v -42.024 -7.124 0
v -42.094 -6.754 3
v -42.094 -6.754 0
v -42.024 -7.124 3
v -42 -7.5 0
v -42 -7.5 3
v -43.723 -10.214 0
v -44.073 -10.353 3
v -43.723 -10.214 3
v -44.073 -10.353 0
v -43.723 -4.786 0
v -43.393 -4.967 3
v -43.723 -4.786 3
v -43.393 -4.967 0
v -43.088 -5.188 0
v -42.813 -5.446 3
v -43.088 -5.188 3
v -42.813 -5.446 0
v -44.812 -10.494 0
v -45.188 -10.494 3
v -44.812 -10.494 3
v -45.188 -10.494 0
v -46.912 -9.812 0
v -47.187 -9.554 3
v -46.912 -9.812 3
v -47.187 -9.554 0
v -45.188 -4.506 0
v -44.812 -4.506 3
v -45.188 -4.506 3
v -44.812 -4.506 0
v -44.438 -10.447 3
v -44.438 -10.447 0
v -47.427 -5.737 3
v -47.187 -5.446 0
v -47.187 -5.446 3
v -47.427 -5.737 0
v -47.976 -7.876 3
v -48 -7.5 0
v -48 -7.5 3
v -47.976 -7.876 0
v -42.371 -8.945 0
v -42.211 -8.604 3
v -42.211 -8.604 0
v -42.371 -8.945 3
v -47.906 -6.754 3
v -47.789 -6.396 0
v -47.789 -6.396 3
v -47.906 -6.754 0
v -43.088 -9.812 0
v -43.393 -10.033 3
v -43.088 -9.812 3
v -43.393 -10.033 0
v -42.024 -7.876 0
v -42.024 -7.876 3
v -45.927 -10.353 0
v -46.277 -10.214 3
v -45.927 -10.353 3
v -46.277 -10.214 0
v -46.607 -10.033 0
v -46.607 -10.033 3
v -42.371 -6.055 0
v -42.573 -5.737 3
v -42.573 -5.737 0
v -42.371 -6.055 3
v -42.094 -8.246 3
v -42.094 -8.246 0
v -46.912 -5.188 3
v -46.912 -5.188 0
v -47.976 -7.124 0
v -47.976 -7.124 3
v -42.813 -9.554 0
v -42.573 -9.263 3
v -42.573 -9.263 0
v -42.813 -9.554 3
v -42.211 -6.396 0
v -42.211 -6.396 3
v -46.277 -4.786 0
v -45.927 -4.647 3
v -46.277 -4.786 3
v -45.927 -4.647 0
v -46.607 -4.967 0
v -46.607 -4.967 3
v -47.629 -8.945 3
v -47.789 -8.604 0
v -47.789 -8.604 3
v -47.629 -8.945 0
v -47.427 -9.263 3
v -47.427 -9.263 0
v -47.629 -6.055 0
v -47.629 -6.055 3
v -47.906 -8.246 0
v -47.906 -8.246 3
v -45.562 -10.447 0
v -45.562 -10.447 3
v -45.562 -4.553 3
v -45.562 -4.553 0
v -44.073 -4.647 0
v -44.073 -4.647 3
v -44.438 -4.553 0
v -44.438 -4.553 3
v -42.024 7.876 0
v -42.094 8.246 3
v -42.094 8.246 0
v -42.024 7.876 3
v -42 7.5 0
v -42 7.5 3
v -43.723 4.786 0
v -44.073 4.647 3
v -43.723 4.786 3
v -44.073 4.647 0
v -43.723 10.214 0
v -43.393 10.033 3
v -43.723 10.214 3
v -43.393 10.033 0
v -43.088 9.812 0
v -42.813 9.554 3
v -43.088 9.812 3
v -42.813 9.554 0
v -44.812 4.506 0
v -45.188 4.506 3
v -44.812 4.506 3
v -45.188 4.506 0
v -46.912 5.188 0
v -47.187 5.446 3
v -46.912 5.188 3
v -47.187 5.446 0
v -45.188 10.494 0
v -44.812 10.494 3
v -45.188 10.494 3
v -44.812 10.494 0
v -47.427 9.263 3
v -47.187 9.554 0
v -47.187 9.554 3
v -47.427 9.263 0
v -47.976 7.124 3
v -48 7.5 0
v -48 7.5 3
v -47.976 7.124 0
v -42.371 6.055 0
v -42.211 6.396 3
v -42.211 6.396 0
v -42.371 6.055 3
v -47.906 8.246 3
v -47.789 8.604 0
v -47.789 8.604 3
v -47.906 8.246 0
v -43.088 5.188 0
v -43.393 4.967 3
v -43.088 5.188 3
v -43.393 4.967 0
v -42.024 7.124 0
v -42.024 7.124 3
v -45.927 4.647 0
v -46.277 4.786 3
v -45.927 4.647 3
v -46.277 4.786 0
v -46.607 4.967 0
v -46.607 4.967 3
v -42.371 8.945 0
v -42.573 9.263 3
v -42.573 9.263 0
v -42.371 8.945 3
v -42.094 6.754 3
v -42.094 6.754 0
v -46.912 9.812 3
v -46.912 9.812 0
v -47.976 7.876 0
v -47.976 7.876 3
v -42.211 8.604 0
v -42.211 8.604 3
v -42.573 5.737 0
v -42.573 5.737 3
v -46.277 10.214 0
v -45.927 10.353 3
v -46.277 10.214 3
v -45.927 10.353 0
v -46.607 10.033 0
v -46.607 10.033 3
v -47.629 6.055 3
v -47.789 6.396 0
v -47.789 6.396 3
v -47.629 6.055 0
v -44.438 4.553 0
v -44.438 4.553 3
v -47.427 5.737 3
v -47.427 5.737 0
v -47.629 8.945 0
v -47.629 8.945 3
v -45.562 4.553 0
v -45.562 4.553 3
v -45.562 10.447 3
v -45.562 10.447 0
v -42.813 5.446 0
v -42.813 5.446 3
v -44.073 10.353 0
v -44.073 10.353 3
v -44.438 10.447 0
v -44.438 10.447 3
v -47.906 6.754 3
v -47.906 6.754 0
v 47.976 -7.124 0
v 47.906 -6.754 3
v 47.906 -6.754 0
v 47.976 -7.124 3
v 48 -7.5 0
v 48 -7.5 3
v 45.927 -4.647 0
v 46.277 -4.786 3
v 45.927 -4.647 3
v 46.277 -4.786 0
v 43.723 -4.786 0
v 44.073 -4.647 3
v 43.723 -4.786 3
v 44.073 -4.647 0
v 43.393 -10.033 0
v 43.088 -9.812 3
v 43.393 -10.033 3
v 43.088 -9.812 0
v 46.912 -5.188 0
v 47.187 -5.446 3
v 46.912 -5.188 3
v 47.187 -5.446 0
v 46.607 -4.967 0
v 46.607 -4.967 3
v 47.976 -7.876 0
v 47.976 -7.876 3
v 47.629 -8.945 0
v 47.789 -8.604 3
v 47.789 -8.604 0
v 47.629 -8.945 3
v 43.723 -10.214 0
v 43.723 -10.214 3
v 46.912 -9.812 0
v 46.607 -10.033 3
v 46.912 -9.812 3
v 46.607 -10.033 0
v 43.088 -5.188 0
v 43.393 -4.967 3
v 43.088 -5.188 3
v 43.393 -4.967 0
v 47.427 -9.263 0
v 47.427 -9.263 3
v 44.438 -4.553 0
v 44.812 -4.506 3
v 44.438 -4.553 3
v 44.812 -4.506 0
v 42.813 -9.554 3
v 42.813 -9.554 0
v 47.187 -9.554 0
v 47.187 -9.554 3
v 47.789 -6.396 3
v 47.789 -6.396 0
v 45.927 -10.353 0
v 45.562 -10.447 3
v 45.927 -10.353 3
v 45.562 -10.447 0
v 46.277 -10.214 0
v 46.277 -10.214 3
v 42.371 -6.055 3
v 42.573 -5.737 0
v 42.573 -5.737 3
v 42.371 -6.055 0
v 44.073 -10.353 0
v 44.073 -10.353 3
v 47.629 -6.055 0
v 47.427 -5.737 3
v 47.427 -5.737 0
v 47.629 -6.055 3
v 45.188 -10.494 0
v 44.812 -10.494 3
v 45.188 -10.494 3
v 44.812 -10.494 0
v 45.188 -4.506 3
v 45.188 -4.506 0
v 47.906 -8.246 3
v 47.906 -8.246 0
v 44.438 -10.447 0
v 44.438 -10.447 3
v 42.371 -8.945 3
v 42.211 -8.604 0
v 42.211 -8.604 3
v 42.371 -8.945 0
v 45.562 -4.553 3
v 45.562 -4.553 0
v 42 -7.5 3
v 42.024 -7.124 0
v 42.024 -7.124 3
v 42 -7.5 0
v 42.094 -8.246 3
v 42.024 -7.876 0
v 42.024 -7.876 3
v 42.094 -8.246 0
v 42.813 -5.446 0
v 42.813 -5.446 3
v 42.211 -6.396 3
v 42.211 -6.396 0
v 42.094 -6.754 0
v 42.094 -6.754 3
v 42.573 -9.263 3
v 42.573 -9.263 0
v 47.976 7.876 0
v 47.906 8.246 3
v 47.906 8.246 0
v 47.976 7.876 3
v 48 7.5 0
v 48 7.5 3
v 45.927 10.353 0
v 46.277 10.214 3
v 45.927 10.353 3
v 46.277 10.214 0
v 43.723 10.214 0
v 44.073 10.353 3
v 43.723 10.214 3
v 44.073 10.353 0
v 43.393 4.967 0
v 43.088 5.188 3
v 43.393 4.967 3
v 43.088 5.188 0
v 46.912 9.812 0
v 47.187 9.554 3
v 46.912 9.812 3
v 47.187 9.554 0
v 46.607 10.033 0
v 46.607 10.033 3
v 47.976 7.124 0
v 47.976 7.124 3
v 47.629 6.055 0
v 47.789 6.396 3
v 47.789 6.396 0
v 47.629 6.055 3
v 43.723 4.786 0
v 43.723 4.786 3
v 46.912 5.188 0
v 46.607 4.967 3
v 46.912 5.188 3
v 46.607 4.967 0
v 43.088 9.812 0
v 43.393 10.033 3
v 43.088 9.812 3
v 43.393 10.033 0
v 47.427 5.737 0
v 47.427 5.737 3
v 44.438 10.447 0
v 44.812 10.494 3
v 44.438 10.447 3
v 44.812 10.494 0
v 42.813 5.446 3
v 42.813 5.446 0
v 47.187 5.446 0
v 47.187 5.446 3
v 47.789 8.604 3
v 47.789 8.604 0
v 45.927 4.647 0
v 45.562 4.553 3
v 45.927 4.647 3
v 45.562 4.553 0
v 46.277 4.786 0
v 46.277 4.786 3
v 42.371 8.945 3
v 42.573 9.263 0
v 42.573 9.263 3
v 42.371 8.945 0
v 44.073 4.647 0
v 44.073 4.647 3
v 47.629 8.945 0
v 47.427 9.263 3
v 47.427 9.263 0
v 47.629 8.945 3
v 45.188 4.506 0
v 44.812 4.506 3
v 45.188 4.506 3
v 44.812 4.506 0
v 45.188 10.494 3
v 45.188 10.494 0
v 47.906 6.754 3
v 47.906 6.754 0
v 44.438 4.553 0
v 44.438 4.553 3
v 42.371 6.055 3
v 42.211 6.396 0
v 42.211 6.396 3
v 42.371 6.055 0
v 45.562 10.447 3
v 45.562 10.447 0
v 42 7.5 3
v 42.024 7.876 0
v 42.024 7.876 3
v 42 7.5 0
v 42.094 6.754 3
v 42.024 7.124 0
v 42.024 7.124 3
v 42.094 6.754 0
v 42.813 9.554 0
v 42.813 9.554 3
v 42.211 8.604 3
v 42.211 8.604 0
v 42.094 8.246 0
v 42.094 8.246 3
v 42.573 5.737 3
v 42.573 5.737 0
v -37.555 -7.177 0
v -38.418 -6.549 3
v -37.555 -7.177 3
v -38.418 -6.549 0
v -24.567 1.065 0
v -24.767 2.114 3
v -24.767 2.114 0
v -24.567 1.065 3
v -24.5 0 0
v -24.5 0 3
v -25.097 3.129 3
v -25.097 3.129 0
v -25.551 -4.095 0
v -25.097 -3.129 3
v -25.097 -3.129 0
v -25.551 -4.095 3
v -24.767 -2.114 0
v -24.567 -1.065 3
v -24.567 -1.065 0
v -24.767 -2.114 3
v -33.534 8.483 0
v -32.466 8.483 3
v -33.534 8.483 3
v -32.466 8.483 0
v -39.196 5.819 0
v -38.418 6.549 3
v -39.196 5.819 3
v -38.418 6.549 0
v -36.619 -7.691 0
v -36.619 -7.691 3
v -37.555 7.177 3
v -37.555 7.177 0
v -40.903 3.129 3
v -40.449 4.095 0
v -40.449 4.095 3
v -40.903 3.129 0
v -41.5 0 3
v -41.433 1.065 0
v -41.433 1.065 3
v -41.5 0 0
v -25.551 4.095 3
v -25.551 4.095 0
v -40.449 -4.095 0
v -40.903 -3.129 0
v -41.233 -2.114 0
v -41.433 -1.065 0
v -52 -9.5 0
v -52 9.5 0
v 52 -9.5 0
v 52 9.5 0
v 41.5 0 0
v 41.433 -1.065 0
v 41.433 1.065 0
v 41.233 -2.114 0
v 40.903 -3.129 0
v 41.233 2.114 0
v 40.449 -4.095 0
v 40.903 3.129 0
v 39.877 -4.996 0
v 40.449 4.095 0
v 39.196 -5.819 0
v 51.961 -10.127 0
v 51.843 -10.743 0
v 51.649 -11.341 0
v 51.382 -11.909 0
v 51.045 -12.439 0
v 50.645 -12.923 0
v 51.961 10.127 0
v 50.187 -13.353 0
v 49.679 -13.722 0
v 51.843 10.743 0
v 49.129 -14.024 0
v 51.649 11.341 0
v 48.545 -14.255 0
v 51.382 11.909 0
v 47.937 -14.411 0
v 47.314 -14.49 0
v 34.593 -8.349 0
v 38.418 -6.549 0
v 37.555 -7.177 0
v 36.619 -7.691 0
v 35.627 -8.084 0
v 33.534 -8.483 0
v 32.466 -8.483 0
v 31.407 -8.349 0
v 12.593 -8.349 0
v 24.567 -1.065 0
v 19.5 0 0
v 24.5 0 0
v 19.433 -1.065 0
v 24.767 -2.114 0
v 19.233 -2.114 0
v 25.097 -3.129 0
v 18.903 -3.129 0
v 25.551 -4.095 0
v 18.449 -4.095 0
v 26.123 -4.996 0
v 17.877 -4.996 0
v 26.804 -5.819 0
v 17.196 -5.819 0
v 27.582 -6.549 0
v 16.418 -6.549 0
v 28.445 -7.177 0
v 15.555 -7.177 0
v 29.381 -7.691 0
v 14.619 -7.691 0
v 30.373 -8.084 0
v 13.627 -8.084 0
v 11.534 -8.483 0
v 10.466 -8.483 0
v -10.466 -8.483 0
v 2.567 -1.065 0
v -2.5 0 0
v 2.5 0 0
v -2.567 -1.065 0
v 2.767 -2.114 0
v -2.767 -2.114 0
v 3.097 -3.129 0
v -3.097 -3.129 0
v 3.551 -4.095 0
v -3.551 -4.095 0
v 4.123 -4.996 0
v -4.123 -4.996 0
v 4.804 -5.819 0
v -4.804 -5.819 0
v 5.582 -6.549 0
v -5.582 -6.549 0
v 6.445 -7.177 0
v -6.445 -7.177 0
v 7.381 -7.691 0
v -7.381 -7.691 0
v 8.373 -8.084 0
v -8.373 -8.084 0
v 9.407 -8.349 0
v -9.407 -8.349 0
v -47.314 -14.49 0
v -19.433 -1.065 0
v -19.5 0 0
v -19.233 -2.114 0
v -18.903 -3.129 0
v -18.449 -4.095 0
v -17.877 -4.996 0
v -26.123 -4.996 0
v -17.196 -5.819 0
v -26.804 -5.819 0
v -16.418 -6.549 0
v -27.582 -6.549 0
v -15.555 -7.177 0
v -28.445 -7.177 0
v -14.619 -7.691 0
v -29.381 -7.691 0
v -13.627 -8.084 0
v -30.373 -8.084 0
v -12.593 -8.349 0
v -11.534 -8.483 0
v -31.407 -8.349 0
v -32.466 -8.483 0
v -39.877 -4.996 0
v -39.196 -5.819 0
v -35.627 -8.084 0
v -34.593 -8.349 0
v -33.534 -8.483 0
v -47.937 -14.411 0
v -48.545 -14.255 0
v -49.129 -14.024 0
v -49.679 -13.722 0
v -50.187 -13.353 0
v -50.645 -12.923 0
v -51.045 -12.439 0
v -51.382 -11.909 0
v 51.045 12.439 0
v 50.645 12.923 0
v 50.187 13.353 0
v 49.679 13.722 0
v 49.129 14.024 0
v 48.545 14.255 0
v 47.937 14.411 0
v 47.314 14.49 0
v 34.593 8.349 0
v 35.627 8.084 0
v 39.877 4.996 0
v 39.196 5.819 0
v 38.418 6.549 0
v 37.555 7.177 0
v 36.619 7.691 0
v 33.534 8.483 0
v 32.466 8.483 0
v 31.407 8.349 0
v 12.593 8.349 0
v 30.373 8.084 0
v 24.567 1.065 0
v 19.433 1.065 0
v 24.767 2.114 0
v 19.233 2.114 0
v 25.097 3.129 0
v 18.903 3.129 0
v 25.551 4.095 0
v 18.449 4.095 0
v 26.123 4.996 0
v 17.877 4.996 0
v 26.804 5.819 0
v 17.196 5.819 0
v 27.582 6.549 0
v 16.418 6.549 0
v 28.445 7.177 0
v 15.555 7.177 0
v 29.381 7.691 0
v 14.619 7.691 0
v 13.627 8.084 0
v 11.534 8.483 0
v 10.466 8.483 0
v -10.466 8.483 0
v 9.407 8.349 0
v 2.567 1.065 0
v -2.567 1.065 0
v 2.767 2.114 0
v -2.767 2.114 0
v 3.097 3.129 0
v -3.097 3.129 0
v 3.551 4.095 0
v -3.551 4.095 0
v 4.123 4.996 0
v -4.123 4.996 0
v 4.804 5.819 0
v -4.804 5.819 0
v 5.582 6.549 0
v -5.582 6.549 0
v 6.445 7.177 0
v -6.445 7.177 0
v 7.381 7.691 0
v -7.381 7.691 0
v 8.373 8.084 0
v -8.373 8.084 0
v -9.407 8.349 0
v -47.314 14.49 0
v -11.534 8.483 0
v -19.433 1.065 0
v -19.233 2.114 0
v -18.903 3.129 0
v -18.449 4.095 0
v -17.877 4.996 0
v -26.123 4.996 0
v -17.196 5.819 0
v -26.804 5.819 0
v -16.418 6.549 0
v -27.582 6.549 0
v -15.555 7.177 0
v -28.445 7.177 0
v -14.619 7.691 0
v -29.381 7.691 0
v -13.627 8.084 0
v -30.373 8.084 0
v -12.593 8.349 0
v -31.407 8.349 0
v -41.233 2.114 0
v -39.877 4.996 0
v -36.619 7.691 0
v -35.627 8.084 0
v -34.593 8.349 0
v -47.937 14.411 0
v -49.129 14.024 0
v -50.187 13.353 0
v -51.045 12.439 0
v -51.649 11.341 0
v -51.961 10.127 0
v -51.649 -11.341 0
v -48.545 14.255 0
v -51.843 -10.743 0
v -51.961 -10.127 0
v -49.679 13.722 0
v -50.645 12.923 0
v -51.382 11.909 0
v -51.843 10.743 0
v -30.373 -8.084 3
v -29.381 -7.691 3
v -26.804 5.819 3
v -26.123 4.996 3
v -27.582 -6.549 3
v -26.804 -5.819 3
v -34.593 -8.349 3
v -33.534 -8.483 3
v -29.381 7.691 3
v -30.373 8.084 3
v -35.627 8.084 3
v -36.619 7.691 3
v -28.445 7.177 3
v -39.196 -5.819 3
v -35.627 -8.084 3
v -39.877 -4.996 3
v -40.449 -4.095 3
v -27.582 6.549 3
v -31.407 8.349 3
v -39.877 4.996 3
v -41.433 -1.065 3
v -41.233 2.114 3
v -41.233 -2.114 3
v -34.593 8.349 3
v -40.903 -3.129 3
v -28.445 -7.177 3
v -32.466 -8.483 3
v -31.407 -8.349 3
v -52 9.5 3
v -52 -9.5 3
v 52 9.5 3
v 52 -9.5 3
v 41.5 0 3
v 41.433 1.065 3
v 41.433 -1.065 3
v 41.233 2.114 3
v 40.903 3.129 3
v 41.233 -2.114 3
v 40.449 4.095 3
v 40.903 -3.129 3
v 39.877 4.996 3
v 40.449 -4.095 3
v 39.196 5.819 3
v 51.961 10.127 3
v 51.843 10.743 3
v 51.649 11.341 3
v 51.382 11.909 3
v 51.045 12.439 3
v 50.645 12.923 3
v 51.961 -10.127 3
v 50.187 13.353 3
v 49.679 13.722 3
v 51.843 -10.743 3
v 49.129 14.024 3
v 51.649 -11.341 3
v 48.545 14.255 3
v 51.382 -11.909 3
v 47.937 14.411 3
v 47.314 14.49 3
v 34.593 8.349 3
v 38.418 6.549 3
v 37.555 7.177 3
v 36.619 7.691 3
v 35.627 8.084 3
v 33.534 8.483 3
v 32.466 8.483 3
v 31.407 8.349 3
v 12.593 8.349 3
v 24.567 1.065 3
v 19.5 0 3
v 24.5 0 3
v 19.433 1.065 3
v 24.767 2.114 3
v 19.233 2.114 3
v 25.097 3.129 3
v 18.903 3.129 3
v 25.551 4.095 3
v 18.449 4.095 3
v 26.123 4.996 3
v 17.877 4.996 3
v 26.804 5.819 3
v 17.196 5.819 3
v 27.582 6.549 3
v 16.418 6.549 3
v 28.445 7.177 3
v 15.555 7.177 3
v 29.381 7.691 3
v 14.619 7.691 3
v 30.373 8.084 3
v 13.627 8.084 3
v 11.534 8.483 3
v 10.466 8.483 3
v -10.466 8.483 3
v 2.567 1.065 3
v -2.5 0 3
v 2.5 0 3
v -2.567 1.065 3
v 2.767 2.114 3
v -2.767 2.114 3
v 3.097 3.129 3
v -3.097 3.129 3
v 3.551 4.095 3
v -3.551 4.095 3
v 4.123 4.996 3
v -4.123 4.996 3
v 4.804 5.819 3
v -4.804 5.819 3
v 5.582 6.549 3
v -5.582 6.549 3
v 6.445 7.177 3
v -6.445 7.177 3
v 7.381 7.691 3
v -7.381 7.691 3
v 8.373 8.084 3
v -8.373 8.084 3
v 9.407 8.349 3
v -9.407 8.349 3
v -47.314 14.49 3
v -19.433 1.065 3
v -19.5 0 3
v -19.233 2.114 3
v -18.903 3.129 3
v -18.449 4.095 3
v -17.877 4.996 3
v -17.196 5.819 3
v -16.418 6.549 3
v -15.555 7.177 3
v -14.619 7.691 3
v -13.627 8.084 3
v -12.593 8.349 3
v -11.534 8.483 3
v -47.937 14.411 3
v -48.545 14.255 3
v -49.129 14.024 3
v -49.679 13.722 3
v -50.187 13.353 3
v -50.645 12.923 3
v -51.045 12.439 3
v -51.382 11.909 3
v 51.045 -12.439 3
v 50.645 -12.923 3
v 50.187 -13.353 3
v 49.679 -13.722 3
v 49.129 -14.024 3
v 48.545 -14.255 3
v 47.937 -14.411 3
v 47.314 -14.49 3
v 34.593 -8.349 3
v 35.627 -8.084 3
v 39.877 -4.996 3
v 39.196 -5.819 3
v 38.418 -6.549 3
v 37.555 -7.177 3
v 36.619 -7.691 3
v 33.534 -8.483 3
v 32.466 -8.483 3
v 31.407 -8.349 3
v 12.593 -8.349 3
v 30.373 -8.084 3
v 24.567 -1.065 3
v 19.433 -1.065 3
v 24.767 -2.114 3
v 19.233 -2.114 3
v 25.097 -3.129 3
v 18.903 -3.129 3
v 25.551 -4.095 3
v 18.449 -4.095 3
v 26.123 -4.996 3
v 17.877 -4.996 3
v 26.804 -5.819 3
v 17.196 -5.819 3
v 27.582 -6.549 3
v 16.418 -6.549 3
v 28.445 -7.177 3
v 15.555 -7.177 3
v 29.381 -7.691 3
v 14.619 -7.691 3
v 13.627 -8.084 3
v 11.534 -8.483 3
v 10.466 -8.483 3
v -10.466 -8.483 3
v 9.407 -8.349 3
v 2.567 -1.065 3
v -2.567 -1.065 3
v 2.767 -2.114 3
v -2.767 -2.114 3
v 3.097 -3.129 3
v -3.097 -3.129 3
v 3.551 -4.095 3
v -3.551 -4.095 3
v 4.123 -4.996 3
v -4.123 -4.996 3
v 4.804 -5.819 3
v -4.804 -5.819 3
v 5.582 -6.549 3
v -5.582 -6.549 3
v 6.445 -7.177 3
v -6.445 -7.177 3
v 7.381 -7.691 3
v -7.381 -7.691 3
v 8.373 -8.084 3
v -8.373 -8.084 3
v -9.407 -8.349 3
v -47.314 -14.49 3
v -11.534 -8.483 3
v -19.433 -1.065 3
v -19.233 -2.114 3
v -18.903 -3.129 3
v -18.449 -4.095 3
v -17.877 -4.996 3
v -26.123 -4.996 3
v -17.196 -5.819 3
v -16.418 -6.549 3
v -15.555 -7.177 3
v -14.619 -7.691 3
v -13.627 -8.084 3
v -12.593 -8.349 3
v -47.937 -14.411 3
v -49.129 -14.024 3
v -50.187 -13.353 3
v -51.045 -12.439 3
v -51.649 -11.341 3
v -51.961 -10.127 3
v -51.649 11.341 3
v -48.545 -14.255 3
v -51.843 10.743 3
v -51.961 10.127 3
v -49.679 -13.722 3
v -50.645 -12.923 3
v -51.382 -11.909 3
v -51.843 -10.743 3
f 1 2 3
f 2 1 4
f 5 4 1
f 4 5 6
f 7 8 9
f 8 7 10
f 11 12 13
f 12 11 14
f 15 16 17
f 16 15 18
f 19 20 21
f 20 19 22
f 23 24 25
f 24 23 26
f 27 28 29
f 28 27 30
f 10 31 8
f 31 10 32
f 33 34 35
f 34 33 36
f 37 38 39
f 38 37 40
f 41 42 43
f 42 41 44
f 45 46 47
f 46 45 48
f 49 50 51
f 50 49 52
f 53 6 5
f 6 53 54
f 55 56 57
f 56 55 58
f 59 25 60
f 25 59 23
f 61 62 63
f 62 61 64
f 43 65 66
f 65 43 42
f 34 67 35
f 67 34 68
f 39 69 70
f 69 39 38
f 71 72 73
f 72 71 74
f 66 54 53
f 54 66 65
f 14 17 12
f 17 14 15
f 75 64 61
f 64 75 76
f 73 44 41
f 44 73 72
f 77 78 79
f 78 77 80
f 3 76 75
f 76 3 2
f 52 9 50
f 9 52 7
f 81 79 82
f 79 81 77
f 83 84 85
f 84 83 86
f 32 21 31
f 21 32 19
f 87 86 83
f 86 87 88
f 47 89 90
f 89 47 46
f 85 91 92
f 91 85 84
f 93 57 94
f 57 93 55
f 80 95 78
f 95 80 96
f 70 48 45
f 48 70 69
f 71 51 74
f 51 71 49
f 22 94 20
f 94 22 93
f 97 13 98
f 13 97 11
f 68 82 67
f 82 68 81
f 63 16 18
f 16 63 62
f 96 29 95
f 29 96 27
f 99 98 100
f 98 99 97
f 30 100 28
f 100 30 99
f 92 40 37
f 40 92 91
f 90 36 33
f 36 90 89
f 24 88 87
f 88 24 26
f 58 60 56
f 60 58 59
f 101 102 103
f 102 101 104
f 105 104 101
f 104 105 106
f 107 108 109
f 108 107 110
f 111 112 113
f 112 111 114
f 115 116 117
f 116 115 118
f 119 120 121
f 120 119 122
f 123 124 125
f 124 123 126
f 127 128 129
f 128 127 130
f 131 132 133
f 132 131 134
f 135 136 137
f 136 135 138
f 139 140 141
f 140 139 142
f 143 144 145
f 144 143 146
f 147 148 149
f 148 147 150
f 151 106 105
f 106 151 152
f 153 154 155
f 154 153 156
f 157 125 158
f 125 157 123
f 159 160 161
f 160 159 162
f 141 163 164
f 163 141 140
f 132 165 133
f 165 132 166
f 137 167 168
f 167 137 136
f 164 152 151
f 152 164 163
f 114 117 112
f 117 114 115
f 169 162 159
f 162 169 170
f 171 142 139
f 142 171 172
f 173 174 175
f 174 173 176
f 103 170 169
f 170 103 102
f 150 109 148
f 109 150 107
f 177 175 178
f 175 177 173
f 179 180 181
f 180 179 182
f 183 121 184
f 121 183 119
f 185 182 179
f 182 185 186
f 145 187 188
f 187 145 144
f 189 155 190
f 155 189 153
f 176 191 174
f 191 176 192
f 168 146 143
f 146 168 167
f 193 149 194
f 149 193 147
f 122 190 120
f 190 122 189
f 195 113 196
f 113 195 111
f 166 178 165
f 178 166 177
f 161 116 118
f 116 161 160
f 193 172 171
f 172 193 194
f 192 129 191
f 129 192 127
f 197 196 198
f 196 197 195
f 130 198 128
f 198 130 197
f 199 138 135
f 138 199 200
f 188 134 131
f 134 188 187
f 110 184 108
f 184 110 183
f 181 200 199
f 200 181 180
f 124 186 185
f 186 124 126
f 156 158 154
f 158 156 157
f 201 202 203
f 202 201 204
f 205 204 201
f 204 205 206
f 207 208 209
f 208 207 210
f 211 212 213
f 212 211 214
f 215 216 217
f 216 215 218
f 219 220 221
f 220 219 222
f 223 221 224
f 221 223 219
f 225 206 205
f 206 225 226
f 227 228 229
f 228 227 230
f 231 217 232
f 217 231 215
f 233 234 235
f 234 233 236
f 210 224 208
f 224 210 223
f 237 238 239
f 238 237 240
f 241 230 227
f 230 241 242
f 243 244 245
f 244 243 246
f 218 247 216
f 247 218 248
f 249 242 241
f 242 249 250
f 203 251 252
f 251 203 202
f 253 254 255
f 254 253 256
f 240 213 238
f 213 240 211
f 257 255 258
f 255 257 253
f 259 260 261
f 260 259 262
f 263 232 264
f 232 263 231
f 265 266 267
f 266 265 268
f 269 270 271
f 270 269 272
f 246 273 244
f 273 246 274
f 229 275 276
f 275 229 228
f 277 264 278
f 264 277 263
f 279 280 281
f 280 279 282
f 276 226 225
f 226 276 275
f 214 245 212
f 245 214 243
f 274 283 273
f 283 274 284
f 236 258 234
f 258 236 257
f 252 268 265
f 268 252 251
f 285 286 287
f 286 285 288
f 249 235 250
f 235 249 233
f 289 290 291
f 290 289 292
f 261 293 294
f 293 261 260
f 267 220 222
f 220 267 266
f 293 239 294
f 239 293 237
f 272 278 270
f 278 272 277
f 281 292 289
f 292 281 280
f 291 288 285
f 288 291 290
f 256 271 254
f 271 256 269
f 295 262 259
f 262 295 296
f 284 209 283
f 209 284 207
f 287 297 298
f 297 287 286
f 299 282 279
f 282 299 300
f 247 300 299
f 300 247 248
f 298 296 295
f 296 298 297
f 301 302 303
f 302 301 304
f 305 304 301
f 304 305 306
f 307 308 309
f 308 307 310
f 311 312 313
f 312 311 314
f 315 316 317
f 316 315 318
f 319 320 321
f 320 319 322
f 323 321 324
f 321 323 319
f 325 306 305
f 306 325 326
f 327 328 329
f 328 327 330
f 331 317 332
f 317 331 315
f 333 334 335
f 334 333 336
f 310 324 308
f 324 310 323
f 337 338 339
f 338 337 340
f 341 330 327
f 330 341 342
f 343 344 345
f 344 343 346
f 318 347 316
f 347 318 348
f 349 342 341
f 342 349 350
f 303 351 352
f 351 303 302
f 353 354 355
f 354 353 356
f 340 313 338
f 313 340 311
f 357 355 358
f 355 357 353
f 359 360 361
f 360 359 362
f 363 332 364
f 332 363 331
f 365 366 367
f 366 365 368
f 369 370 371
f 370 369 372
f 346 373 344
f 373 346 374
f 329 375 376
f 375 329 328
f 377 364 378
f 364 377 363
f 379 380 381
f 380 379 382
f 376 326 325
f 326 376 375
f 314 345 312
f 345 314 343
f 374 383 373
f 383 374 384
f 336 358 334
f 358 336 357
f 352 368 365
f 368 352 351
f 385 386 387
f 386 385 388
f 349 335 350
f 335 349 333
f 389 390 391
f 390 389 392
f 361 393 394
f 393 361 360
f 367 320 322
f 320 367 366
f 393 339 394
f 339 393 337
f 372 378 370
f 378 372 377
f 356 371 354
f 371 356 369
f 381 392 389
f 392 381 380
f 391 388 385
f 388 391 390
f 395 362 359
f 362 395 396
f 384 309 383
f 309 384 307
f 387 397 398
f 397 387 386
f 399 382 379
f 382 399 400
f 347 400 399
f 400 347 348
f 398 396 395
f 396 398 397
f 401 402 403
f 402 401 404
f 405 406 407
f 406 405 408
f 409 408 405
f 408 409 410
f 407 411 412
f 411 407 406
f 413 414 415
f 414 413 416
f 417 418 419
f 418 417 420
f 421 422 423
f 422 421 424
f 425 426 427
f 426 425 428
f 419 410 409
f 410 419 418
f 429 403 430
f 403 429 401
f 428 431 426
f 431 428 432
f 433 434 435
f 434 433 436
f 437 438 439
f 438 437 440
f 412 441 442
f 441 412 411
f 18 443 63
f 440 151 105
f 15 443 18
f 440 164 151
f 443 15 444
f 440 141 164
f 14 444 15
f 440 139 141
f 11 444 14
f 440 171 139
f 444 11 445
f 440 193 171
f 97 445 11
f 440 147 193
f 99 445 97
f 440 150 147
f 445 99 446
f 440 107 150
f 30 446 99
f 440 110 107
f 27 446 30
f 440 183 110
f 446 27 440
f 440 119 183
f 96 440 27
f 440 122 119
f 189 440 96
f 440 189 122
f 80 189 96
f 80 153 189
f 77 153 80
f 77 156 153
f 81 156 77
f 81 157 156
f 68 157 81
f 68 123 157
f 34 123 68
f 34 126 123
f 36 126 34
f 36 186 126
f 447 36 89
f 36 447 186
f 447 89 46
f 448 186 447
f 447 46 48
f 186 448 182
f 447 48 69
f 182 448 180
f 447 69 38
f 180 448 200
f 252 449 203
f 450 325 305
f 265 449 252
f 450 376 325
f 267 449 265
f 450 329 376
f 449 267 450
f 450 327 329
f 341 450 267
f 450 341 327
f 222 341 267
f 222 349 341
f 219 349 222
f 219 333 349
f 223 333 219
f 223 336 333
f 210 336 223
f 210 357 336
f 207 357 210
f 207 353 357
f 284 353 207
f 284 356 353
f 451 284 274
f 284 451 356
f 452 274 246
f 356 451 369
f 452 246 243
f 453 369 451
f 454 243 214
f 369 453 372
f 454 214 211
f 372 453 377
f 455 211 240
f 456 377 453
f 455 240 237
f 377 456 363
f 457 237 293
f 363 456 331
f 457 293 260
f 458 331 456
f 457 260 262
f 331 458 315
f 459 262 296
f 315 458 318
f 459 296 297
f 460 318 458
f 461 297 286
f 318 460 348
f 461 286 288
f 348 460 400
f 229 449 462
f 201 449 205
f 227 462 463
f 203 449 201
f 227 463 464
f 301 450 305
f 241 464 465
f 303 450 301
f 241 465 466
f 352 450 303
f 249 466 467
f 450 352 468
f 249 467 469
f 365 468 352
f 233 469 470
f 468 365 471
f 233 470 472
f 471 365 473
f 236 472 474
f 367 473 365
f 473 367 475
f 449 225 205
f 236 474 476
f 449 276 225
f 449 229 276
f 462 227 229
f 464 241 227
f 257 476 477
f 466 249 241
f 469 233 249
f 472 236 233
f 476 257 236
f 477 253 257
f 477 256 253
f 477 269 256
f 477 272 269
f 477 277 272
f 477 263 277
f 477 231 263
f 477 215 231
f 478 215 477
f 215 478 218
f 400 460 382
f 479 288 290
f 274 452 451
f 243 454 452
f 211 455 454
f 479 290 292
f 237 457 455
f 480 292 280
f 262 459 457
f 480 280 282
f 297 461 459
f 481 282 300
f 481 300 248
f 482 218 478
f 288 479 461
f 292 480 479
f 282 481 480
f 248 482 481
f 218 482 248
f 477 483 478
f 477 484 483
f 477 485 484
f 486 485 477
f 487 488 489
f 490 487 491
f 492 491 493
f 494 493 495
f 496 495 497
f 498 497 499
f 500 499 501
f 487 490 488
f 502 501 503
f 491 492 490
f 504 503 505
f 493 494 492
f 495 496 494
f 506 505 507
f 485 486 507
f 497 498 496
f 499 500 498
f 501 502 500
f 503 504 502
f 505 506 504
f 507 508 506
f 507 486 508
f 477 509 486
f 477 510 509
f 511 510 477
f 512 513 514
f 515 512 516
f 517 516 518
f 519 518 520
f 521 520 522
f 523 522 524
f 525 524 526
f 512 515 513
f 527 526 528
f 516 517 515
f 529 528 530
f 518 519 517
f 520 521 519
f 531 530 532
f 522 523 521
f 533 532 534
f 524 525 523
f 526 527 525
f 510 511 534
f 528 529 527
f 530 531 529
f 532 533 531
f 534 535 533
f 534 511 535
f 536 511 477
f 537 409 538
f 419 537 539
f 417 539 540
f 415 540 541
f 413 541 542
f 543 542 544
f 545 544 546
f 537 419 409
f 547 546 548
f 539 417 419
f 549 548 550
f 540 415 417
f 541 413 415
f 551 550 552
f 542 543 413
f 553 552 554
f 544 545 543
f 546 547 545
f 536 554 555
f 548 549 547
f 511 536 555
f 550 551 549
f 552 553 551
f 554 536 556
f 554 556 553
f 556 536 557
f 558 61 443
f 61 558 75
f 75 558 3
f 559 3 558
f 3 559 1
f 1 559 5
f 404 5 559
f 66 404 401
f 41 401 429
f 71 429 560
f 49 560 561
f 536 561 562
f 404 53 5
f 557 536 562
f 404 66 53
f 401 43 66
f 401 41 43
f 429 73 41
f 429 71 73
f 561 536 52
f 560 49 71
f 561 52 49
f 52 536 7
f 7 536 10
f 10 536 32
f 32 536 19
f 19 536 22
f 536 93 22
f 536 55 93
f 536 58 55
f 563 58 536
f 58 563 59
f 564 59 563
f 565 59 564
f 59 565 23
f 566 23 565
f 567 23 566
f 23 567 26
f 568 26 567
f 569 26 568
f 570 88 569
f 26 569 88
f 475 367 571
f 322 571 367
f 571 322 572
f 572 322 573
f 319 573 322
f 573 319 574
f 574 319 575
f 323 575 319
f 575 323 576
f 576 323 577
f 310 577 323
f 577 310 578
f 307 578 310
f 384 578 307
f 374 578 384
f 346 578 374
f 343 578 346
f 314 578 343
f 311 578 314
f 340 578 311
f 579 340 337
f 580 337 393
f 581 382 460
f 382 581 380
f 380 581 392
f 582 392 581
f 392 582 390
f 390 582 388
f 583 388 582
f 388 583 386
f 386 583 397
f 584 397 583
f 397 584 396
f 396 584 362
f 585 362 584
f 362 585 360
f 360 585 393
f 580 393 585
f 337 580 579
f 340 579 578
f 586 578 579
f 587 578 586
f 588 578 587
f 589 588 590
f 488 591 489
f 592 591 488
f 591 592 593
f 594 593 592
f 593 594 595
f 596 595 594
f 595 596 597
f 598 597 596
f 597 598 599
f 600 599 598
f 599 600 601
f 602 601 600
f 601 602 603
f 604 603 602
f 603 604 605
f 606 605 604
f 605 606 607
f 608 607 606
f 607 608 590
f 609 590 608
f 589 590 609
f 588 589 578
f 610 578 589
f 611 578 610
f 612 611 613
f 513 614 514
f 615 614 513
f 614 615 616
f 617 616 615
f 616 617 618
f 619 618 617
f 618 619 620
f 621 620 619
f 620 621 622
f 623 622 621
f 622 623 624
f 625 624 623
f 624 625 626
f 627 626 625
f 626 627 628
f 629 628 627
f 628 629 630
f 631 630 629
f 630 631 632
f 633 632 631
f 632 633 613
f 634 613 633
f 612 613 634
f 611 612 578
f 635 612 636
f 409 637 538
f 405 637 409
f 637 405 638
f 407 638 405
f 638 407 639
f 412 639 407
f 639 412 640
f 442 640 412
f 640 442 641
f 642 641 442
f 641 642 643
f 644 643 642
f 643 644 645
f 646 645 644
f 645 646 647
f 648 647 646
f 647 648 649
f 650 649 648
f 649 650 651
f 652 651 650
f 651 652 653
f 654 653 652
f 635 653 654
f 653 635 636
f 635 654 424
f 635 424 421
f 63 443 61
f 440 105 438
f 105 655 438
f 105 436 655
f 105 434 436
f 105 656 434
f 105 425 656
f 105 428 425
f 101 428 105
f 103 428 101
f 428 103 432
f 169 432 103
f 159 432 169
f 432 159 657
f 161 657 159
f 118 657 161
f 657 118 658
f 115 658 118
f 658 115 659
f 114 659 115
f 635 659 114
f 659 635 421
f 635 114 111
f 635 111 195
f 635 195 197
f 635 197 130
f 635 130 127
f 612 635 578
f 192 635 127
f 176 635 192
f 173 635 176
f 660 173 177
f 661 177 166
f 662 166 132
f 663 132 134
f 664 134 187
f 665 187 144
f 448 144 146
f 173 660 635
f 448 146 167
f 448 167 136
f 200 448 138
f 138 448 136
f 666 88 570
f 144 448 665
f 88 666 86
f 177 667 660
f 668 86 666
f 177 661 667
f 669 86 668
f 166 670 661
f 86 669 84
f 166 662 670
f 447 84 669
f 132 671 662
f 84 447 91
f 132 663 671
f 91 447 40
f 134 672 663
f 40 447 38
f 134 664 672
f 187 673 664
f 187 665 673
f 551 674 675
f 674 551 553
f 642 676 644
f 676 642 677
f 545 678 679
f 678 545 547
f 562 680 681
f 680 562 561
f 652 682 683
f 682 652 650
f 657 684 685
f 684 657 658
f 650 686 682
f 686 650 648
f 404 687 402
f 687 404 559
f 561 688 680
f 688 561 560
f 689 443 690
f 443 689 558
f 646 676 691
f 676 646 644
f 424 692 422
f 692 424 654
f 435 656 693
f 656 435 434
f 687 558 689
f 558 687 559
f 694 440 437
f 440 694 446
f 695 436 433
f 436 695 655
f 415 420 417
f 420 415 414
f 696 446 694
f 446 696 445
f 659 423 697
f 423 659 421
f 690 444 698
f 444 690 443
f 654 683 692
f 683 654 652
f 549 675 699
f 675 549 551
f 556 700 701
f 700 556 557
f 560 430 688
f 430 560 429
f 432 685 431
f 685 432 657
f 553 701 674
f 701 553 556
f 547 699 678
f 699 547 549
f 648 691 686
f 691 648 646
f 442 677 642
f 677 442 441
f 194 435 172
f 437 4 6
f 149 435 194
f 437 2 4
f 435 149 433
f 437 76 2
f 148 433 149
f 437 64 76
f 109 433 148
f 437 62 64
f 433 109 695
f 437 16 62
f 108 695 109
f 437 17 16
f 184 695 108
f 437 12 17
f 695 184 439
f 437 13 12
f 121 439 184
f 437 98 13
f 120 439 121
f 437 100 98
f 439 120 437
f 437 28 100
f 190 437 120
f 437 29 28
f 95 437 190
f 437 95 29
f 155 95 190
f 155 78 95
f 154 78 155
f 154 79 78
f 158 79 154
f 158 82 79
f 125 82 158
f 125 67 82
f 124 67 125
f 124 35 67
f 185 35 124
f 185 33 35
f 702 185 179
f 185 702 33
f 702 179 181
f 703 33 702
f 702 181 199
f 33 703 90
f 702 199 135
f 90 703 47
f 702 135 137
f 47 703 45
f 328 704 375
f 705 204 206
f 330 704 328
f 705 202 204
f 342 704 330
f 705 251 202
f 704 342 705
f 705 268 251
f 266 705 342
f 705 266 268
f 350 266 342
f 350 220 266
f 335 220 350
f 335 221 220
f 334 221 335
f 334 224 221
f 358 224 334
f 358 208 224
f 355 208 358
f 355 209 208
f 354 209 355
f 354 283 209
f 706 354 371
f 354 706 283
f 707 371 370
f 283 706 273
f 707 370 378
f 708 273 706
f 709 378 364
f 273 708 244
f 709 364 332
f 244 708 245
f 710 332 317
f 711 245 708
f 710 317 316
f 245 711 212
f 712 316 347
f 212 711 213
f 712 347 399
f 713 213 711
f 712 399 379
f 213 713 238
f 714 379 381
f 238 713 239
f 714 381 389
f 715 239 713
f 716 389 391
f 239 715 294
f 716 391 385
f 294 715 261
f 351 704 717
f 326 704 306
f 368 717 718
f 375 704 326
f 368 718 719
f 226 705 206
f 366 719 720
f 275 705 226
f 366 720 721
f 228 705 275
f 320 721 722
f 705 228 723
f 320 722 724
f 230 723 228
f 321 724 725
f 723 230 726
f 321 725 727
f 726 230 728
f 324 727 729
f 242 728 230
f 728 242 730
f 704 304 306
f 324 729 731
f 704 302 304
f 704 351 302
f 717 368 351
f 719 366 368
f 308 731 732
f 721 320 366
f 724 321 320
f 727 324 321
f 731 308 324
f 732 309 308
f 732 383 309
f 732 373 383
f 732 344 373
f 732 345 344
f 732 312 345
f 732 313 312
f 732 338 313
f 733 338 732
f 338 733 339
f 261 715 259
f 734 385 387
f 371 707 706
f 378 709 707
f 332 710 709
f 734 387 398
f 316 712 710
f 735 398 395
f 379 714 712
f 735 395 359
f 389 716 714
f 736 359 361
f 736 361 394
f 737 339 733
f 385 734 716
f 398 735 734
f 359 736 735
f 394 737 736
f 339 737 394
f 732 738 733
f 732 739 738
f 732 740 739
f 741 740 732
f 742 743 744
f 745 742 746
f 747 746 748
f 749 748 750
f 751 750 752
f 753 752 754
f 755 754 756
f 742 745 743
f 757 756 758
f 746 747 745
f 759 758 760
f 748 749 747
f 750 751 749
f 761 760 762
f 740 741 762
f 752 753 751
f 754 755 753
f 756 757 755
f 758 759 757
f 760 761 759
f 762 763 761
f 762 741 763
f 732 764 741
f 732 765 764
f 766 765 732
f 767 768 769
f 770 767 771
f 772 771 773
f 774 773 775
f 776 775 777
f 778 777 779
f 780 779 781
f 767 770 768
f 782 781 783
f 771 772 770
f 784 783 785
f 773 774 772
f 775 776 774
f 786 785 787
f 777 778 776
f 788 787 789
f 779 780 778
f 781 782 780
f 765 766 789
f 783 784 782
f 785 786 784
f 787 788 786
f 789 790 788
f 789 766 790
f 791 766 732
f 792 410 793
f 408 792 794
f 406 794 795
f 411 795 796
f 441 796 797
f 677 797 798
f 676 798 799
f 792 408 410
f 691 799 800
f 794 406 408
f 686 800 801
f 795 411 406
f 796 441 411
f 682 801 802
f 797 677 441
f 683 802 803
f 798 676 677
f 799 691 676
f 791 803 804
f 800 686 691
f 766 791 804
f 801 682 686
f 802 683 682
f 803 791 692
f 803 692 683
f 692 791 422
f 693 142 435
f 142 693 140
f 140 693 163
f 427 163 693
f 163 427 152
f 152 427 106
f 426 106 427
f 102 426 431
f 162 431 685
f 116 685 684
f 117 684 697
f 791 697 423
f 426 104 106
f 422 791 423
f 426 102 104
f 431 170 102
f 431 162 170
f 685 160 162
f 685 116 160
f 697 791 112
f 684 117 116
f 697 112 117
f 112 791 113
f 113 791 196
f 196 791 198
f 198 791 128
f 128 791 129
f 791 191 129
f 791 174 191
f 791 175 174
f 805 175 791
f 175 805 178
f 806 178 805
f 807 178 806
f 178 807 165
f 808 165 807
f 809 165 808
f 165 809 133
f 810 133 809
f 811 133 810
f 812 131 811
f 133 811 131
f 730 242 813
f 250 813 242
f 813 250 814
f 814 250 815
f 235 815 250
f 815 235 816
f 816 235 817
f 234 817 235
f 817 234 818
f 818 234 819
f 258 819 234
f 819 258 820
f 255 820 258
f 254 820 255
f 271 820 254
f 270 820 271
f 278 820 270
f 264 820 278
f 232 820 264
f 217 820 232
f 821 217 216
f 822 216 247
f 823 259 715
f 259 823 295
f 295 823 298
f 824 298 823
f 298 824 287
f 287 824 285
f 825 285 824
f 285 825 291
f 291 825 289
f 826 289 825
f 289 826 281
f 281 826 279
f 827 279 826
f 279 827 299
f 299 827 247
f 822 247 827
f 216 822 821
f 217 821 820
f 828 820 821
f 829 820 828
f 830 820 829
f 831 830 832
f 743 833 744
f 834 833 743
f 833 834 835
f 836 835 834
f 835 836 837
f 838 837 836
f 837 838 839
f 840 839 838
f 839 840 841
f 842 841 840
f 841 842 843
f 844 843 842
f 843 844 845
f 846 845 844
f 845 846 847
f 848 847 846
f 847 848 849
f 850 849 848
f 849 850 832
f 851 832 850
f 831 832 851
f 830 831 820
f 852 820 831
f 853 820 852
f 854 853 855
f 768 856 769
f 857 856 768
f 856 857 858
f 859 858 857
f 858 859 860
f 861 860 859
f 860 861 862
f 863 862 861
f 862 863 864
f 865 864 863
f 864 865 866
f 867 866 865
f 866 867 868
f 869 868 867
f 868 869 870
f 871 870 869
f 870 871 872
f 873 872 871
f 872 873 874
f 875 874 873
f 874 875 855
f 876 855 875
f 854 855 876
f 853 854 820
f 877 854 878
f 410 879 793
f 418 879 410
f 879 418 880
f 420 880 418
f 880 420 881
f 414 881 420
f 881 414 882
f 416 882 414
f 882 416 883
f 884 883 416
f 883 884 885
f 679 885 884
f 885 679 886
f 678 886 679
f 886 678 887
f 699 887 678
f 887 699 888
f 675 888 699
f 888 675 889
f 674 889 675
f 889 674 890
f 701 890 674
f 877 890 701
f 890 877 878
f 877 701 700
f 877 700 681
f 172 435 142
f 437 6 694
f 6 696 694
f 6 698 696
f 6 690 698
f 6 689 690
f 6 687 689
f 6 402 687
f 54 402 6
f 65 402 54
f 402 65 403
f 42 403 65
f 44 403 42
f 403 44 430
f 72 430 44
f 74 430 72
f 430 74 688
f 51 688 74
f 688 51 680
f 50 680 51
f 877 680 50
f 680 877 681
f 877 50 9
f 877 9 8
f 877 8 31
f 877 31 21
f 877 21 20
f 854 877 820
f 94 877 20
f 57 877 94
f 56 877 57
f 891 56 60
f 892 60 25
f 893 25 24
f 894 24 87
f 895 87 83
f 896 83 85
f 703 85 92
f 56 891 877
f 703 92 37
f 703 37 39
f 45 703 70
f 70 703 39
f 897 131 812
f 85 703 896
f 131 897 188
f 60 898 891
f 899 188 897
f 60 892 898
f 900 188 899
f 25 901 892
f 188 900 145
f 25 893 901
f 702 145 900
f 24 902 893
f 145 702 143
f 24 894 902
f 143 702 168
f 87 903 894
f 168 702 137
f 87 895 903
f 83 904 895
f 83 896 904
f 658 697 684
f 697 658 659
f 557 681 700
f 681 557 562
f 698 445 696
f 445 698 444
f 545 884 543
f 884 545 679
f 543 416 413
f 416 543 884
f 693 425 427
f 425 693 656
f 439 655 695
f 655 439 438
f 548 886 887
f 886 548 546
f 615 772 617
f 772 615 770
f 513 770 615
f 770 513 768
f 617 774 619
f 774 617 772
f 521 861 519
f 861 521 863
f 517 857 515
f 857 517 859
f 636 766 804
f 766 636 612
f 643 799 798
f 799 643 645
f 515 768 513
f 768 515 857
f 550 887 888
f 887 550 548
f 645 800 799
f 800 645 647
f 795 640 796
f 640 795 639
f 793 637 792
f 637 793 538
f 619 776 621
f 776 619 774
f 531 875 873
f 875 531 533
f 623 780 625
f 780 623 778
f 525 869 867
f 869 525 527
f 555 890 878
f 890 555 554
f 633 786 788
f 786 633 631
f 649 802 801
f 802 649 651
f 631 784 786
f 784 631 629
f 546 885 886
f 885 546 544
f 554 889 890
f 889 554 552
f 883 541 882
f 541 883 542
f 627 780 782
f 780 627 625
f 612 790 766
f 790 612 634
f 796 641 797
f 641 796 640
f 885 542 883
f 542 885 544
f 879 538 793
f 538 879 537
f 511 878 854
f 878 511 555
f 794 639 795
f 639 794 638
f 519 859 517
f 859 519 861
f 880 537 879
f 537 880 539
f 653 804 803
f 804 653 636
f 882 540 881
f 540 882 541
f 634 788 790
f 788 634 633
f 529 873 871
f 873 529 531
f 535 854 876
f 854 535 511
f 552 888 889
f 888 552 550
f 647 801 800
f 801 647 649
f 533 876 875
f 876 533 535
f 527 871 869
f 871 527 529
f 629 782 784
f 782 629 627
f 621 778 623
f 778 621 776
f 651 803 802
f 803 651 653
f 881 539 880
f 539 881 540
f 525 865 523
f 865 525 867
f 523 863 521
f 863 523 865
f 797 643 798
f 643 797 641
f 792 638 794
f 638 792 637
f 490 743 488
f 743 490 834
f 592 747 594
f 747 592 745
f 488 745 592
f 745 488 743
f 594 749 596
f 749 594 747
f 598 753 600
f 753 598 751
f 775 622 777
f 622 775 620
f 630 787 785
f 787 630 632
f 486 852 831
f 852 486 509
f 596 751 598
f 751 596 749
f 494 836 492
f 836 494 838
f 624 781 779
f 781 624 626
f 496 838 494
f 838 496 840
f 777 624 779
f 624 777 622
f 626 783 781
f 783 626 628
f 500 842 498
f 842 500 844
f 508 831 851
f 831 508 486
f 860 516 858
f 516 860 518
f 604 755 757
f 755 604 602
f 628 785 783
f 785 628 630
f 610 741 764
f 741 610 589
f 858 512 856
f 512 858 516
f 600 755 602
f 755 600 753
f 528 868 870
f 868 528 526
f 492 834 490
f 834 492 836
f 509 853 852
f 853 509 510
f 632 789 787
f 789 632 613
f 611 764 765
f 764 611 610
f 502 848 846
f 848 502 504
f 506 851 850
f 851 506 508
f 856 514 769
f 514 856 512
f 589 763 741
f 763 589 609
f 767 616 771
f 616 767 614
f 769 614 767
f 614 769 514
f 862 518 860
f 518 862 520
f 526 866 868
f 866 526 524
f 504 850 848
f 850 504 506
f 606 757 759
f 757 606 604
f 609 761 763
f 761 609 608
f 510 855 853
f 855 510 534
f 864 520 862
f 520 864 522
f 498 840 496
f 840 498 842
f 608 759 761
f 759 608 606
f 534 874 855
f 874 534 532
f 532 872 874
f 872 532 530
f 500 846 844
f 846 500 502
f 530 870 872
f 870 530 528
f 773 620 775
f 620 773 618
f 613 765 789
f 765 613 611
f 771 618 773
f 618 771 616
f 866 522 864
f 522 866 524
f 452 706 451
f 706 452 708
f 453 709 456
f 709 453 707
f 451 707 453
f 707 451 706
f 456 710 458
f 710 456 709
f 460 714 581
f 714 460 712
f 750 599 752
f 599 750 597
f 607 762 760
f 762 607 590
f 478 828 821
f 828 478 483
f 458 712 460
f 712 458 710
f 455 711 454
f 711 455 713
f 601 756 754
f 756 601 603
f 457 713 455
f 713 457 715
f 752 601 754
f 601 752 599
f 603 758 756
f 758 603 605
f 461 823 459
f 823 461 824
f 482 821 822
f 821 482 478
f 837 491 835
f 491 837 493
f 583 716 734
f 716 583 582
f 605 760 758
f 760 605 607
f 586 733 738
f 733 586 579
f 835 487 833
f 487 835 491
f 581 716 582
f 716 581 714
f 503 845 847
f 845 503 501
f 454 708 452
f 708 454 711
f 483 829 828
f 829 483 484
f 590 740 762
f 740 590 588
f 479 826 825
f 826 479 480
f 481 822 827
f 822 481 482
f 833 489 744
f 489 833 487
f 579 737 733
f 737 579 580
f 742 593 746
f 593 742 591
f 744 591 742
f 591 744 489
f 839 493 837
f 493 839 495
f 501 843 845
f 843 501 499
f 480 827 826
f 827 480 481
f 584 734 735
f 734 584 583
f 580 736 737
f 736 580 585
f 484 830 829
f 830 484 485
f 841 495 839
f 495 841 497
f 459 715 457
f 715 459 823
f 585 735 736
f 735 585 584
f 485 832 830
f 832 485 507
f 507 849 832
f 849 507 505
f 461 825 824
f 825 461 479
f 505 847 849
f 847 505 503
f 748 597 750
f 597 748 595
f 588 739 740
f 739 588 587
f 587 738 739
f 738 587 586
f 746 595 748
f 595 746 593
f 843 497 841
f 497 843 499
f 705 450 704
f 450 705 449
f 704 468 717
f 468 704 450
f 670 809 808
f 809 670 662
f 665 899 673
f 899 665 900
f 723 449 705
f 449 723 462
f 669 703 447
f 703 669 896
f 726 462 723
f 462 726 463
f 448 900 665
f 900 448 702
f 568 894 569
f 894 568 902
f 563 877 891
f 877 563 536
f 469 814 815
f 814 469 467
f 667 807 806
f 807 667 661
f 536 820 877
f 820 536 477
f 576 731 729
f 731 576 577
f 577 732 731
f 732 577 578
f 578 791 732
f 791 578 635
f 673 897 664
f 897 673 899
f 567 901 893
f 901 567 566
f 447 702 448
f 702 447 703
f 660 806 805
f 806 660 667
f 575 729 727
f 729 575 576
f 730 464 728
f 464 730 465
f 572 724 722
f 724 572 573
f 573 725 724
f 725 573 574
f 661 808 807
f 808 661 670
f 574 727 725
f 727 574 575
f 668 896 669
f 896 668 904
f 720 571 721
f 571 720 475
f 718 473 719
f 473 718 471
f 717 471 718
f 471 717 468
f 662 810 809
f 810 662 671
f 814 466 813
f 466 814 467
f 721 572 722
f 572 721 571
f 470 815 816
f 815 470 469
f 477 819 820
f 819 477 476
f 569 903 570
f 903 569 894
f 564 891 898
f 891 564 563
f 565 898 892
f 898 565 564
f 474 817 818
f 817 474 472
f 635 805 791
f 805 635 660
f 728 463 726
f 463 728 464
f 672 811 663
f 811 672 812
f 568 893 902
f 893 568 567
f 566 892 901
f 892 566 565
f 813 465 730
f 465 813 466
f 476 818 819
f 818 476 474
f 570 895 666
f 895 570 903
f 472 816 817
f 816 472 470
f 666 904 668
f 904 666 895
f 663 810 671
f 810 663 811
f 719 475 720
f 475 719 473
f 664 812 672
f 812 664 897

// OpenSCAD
$fn = 50;


difference() {
	union() {
		hull() {
			translate(v = [-47.0000000000, 9.5000000000, 0]) {
				cylinder(h = 3, r = 5);
			}
			translate(v = [47.0000000000, 9.5000000000, 0]) {
				cylinder(h = 3, r = 5);
			}
			translate(v = [-47.0000000000, -9.5000000000, 0]) {
				cylinder(h = 3, r = 5);
			}
			translate(v = [47.0000000000, -9.5000000000, 0]) {
				cylinder(h = 3, r = 5);
			}
		}
	}
	union() {
		#translate(v = [-45.0000000000, -7.5000000000, -100.0000000000]) {
			cylinder(h = 200, r = 3.0000000000);
		}
		#translate(v = [-45.0000000000, 7.5000000000, -100.0000000000]) {
			cylinder(h = 200, r = 3.0000000000);
		}
		#translate(v = [45.0000000000, -7.5000000000, -100.0000000000]) {
			cylinder(h = 200, r = 3.0000000000);
		}
		#translate(v = [45.0000000000, 7.5000000000, -100.0000000000]) {
			cylinder(h = 200, r = 3.0000000000);
		}
		#translate(v = [-33.0000000000, 0, 0]) {
			cylinder(h = 3, r = 8.5000000000);
		}
		#translate(v = [-11.0000000000, 0, 0]) {
			cylinder(h = 3, r = 8.5000000000);
		}
		#translate(v = [11.0000000000, 0, 0]) {
			cylinder(h = 3, r = 8.5000000000);
		}
		#translate(v = [33.0000000000, 0, 0]) {
			cylinder(h = 3, r = 8.5000000000);
		}
	}
}
